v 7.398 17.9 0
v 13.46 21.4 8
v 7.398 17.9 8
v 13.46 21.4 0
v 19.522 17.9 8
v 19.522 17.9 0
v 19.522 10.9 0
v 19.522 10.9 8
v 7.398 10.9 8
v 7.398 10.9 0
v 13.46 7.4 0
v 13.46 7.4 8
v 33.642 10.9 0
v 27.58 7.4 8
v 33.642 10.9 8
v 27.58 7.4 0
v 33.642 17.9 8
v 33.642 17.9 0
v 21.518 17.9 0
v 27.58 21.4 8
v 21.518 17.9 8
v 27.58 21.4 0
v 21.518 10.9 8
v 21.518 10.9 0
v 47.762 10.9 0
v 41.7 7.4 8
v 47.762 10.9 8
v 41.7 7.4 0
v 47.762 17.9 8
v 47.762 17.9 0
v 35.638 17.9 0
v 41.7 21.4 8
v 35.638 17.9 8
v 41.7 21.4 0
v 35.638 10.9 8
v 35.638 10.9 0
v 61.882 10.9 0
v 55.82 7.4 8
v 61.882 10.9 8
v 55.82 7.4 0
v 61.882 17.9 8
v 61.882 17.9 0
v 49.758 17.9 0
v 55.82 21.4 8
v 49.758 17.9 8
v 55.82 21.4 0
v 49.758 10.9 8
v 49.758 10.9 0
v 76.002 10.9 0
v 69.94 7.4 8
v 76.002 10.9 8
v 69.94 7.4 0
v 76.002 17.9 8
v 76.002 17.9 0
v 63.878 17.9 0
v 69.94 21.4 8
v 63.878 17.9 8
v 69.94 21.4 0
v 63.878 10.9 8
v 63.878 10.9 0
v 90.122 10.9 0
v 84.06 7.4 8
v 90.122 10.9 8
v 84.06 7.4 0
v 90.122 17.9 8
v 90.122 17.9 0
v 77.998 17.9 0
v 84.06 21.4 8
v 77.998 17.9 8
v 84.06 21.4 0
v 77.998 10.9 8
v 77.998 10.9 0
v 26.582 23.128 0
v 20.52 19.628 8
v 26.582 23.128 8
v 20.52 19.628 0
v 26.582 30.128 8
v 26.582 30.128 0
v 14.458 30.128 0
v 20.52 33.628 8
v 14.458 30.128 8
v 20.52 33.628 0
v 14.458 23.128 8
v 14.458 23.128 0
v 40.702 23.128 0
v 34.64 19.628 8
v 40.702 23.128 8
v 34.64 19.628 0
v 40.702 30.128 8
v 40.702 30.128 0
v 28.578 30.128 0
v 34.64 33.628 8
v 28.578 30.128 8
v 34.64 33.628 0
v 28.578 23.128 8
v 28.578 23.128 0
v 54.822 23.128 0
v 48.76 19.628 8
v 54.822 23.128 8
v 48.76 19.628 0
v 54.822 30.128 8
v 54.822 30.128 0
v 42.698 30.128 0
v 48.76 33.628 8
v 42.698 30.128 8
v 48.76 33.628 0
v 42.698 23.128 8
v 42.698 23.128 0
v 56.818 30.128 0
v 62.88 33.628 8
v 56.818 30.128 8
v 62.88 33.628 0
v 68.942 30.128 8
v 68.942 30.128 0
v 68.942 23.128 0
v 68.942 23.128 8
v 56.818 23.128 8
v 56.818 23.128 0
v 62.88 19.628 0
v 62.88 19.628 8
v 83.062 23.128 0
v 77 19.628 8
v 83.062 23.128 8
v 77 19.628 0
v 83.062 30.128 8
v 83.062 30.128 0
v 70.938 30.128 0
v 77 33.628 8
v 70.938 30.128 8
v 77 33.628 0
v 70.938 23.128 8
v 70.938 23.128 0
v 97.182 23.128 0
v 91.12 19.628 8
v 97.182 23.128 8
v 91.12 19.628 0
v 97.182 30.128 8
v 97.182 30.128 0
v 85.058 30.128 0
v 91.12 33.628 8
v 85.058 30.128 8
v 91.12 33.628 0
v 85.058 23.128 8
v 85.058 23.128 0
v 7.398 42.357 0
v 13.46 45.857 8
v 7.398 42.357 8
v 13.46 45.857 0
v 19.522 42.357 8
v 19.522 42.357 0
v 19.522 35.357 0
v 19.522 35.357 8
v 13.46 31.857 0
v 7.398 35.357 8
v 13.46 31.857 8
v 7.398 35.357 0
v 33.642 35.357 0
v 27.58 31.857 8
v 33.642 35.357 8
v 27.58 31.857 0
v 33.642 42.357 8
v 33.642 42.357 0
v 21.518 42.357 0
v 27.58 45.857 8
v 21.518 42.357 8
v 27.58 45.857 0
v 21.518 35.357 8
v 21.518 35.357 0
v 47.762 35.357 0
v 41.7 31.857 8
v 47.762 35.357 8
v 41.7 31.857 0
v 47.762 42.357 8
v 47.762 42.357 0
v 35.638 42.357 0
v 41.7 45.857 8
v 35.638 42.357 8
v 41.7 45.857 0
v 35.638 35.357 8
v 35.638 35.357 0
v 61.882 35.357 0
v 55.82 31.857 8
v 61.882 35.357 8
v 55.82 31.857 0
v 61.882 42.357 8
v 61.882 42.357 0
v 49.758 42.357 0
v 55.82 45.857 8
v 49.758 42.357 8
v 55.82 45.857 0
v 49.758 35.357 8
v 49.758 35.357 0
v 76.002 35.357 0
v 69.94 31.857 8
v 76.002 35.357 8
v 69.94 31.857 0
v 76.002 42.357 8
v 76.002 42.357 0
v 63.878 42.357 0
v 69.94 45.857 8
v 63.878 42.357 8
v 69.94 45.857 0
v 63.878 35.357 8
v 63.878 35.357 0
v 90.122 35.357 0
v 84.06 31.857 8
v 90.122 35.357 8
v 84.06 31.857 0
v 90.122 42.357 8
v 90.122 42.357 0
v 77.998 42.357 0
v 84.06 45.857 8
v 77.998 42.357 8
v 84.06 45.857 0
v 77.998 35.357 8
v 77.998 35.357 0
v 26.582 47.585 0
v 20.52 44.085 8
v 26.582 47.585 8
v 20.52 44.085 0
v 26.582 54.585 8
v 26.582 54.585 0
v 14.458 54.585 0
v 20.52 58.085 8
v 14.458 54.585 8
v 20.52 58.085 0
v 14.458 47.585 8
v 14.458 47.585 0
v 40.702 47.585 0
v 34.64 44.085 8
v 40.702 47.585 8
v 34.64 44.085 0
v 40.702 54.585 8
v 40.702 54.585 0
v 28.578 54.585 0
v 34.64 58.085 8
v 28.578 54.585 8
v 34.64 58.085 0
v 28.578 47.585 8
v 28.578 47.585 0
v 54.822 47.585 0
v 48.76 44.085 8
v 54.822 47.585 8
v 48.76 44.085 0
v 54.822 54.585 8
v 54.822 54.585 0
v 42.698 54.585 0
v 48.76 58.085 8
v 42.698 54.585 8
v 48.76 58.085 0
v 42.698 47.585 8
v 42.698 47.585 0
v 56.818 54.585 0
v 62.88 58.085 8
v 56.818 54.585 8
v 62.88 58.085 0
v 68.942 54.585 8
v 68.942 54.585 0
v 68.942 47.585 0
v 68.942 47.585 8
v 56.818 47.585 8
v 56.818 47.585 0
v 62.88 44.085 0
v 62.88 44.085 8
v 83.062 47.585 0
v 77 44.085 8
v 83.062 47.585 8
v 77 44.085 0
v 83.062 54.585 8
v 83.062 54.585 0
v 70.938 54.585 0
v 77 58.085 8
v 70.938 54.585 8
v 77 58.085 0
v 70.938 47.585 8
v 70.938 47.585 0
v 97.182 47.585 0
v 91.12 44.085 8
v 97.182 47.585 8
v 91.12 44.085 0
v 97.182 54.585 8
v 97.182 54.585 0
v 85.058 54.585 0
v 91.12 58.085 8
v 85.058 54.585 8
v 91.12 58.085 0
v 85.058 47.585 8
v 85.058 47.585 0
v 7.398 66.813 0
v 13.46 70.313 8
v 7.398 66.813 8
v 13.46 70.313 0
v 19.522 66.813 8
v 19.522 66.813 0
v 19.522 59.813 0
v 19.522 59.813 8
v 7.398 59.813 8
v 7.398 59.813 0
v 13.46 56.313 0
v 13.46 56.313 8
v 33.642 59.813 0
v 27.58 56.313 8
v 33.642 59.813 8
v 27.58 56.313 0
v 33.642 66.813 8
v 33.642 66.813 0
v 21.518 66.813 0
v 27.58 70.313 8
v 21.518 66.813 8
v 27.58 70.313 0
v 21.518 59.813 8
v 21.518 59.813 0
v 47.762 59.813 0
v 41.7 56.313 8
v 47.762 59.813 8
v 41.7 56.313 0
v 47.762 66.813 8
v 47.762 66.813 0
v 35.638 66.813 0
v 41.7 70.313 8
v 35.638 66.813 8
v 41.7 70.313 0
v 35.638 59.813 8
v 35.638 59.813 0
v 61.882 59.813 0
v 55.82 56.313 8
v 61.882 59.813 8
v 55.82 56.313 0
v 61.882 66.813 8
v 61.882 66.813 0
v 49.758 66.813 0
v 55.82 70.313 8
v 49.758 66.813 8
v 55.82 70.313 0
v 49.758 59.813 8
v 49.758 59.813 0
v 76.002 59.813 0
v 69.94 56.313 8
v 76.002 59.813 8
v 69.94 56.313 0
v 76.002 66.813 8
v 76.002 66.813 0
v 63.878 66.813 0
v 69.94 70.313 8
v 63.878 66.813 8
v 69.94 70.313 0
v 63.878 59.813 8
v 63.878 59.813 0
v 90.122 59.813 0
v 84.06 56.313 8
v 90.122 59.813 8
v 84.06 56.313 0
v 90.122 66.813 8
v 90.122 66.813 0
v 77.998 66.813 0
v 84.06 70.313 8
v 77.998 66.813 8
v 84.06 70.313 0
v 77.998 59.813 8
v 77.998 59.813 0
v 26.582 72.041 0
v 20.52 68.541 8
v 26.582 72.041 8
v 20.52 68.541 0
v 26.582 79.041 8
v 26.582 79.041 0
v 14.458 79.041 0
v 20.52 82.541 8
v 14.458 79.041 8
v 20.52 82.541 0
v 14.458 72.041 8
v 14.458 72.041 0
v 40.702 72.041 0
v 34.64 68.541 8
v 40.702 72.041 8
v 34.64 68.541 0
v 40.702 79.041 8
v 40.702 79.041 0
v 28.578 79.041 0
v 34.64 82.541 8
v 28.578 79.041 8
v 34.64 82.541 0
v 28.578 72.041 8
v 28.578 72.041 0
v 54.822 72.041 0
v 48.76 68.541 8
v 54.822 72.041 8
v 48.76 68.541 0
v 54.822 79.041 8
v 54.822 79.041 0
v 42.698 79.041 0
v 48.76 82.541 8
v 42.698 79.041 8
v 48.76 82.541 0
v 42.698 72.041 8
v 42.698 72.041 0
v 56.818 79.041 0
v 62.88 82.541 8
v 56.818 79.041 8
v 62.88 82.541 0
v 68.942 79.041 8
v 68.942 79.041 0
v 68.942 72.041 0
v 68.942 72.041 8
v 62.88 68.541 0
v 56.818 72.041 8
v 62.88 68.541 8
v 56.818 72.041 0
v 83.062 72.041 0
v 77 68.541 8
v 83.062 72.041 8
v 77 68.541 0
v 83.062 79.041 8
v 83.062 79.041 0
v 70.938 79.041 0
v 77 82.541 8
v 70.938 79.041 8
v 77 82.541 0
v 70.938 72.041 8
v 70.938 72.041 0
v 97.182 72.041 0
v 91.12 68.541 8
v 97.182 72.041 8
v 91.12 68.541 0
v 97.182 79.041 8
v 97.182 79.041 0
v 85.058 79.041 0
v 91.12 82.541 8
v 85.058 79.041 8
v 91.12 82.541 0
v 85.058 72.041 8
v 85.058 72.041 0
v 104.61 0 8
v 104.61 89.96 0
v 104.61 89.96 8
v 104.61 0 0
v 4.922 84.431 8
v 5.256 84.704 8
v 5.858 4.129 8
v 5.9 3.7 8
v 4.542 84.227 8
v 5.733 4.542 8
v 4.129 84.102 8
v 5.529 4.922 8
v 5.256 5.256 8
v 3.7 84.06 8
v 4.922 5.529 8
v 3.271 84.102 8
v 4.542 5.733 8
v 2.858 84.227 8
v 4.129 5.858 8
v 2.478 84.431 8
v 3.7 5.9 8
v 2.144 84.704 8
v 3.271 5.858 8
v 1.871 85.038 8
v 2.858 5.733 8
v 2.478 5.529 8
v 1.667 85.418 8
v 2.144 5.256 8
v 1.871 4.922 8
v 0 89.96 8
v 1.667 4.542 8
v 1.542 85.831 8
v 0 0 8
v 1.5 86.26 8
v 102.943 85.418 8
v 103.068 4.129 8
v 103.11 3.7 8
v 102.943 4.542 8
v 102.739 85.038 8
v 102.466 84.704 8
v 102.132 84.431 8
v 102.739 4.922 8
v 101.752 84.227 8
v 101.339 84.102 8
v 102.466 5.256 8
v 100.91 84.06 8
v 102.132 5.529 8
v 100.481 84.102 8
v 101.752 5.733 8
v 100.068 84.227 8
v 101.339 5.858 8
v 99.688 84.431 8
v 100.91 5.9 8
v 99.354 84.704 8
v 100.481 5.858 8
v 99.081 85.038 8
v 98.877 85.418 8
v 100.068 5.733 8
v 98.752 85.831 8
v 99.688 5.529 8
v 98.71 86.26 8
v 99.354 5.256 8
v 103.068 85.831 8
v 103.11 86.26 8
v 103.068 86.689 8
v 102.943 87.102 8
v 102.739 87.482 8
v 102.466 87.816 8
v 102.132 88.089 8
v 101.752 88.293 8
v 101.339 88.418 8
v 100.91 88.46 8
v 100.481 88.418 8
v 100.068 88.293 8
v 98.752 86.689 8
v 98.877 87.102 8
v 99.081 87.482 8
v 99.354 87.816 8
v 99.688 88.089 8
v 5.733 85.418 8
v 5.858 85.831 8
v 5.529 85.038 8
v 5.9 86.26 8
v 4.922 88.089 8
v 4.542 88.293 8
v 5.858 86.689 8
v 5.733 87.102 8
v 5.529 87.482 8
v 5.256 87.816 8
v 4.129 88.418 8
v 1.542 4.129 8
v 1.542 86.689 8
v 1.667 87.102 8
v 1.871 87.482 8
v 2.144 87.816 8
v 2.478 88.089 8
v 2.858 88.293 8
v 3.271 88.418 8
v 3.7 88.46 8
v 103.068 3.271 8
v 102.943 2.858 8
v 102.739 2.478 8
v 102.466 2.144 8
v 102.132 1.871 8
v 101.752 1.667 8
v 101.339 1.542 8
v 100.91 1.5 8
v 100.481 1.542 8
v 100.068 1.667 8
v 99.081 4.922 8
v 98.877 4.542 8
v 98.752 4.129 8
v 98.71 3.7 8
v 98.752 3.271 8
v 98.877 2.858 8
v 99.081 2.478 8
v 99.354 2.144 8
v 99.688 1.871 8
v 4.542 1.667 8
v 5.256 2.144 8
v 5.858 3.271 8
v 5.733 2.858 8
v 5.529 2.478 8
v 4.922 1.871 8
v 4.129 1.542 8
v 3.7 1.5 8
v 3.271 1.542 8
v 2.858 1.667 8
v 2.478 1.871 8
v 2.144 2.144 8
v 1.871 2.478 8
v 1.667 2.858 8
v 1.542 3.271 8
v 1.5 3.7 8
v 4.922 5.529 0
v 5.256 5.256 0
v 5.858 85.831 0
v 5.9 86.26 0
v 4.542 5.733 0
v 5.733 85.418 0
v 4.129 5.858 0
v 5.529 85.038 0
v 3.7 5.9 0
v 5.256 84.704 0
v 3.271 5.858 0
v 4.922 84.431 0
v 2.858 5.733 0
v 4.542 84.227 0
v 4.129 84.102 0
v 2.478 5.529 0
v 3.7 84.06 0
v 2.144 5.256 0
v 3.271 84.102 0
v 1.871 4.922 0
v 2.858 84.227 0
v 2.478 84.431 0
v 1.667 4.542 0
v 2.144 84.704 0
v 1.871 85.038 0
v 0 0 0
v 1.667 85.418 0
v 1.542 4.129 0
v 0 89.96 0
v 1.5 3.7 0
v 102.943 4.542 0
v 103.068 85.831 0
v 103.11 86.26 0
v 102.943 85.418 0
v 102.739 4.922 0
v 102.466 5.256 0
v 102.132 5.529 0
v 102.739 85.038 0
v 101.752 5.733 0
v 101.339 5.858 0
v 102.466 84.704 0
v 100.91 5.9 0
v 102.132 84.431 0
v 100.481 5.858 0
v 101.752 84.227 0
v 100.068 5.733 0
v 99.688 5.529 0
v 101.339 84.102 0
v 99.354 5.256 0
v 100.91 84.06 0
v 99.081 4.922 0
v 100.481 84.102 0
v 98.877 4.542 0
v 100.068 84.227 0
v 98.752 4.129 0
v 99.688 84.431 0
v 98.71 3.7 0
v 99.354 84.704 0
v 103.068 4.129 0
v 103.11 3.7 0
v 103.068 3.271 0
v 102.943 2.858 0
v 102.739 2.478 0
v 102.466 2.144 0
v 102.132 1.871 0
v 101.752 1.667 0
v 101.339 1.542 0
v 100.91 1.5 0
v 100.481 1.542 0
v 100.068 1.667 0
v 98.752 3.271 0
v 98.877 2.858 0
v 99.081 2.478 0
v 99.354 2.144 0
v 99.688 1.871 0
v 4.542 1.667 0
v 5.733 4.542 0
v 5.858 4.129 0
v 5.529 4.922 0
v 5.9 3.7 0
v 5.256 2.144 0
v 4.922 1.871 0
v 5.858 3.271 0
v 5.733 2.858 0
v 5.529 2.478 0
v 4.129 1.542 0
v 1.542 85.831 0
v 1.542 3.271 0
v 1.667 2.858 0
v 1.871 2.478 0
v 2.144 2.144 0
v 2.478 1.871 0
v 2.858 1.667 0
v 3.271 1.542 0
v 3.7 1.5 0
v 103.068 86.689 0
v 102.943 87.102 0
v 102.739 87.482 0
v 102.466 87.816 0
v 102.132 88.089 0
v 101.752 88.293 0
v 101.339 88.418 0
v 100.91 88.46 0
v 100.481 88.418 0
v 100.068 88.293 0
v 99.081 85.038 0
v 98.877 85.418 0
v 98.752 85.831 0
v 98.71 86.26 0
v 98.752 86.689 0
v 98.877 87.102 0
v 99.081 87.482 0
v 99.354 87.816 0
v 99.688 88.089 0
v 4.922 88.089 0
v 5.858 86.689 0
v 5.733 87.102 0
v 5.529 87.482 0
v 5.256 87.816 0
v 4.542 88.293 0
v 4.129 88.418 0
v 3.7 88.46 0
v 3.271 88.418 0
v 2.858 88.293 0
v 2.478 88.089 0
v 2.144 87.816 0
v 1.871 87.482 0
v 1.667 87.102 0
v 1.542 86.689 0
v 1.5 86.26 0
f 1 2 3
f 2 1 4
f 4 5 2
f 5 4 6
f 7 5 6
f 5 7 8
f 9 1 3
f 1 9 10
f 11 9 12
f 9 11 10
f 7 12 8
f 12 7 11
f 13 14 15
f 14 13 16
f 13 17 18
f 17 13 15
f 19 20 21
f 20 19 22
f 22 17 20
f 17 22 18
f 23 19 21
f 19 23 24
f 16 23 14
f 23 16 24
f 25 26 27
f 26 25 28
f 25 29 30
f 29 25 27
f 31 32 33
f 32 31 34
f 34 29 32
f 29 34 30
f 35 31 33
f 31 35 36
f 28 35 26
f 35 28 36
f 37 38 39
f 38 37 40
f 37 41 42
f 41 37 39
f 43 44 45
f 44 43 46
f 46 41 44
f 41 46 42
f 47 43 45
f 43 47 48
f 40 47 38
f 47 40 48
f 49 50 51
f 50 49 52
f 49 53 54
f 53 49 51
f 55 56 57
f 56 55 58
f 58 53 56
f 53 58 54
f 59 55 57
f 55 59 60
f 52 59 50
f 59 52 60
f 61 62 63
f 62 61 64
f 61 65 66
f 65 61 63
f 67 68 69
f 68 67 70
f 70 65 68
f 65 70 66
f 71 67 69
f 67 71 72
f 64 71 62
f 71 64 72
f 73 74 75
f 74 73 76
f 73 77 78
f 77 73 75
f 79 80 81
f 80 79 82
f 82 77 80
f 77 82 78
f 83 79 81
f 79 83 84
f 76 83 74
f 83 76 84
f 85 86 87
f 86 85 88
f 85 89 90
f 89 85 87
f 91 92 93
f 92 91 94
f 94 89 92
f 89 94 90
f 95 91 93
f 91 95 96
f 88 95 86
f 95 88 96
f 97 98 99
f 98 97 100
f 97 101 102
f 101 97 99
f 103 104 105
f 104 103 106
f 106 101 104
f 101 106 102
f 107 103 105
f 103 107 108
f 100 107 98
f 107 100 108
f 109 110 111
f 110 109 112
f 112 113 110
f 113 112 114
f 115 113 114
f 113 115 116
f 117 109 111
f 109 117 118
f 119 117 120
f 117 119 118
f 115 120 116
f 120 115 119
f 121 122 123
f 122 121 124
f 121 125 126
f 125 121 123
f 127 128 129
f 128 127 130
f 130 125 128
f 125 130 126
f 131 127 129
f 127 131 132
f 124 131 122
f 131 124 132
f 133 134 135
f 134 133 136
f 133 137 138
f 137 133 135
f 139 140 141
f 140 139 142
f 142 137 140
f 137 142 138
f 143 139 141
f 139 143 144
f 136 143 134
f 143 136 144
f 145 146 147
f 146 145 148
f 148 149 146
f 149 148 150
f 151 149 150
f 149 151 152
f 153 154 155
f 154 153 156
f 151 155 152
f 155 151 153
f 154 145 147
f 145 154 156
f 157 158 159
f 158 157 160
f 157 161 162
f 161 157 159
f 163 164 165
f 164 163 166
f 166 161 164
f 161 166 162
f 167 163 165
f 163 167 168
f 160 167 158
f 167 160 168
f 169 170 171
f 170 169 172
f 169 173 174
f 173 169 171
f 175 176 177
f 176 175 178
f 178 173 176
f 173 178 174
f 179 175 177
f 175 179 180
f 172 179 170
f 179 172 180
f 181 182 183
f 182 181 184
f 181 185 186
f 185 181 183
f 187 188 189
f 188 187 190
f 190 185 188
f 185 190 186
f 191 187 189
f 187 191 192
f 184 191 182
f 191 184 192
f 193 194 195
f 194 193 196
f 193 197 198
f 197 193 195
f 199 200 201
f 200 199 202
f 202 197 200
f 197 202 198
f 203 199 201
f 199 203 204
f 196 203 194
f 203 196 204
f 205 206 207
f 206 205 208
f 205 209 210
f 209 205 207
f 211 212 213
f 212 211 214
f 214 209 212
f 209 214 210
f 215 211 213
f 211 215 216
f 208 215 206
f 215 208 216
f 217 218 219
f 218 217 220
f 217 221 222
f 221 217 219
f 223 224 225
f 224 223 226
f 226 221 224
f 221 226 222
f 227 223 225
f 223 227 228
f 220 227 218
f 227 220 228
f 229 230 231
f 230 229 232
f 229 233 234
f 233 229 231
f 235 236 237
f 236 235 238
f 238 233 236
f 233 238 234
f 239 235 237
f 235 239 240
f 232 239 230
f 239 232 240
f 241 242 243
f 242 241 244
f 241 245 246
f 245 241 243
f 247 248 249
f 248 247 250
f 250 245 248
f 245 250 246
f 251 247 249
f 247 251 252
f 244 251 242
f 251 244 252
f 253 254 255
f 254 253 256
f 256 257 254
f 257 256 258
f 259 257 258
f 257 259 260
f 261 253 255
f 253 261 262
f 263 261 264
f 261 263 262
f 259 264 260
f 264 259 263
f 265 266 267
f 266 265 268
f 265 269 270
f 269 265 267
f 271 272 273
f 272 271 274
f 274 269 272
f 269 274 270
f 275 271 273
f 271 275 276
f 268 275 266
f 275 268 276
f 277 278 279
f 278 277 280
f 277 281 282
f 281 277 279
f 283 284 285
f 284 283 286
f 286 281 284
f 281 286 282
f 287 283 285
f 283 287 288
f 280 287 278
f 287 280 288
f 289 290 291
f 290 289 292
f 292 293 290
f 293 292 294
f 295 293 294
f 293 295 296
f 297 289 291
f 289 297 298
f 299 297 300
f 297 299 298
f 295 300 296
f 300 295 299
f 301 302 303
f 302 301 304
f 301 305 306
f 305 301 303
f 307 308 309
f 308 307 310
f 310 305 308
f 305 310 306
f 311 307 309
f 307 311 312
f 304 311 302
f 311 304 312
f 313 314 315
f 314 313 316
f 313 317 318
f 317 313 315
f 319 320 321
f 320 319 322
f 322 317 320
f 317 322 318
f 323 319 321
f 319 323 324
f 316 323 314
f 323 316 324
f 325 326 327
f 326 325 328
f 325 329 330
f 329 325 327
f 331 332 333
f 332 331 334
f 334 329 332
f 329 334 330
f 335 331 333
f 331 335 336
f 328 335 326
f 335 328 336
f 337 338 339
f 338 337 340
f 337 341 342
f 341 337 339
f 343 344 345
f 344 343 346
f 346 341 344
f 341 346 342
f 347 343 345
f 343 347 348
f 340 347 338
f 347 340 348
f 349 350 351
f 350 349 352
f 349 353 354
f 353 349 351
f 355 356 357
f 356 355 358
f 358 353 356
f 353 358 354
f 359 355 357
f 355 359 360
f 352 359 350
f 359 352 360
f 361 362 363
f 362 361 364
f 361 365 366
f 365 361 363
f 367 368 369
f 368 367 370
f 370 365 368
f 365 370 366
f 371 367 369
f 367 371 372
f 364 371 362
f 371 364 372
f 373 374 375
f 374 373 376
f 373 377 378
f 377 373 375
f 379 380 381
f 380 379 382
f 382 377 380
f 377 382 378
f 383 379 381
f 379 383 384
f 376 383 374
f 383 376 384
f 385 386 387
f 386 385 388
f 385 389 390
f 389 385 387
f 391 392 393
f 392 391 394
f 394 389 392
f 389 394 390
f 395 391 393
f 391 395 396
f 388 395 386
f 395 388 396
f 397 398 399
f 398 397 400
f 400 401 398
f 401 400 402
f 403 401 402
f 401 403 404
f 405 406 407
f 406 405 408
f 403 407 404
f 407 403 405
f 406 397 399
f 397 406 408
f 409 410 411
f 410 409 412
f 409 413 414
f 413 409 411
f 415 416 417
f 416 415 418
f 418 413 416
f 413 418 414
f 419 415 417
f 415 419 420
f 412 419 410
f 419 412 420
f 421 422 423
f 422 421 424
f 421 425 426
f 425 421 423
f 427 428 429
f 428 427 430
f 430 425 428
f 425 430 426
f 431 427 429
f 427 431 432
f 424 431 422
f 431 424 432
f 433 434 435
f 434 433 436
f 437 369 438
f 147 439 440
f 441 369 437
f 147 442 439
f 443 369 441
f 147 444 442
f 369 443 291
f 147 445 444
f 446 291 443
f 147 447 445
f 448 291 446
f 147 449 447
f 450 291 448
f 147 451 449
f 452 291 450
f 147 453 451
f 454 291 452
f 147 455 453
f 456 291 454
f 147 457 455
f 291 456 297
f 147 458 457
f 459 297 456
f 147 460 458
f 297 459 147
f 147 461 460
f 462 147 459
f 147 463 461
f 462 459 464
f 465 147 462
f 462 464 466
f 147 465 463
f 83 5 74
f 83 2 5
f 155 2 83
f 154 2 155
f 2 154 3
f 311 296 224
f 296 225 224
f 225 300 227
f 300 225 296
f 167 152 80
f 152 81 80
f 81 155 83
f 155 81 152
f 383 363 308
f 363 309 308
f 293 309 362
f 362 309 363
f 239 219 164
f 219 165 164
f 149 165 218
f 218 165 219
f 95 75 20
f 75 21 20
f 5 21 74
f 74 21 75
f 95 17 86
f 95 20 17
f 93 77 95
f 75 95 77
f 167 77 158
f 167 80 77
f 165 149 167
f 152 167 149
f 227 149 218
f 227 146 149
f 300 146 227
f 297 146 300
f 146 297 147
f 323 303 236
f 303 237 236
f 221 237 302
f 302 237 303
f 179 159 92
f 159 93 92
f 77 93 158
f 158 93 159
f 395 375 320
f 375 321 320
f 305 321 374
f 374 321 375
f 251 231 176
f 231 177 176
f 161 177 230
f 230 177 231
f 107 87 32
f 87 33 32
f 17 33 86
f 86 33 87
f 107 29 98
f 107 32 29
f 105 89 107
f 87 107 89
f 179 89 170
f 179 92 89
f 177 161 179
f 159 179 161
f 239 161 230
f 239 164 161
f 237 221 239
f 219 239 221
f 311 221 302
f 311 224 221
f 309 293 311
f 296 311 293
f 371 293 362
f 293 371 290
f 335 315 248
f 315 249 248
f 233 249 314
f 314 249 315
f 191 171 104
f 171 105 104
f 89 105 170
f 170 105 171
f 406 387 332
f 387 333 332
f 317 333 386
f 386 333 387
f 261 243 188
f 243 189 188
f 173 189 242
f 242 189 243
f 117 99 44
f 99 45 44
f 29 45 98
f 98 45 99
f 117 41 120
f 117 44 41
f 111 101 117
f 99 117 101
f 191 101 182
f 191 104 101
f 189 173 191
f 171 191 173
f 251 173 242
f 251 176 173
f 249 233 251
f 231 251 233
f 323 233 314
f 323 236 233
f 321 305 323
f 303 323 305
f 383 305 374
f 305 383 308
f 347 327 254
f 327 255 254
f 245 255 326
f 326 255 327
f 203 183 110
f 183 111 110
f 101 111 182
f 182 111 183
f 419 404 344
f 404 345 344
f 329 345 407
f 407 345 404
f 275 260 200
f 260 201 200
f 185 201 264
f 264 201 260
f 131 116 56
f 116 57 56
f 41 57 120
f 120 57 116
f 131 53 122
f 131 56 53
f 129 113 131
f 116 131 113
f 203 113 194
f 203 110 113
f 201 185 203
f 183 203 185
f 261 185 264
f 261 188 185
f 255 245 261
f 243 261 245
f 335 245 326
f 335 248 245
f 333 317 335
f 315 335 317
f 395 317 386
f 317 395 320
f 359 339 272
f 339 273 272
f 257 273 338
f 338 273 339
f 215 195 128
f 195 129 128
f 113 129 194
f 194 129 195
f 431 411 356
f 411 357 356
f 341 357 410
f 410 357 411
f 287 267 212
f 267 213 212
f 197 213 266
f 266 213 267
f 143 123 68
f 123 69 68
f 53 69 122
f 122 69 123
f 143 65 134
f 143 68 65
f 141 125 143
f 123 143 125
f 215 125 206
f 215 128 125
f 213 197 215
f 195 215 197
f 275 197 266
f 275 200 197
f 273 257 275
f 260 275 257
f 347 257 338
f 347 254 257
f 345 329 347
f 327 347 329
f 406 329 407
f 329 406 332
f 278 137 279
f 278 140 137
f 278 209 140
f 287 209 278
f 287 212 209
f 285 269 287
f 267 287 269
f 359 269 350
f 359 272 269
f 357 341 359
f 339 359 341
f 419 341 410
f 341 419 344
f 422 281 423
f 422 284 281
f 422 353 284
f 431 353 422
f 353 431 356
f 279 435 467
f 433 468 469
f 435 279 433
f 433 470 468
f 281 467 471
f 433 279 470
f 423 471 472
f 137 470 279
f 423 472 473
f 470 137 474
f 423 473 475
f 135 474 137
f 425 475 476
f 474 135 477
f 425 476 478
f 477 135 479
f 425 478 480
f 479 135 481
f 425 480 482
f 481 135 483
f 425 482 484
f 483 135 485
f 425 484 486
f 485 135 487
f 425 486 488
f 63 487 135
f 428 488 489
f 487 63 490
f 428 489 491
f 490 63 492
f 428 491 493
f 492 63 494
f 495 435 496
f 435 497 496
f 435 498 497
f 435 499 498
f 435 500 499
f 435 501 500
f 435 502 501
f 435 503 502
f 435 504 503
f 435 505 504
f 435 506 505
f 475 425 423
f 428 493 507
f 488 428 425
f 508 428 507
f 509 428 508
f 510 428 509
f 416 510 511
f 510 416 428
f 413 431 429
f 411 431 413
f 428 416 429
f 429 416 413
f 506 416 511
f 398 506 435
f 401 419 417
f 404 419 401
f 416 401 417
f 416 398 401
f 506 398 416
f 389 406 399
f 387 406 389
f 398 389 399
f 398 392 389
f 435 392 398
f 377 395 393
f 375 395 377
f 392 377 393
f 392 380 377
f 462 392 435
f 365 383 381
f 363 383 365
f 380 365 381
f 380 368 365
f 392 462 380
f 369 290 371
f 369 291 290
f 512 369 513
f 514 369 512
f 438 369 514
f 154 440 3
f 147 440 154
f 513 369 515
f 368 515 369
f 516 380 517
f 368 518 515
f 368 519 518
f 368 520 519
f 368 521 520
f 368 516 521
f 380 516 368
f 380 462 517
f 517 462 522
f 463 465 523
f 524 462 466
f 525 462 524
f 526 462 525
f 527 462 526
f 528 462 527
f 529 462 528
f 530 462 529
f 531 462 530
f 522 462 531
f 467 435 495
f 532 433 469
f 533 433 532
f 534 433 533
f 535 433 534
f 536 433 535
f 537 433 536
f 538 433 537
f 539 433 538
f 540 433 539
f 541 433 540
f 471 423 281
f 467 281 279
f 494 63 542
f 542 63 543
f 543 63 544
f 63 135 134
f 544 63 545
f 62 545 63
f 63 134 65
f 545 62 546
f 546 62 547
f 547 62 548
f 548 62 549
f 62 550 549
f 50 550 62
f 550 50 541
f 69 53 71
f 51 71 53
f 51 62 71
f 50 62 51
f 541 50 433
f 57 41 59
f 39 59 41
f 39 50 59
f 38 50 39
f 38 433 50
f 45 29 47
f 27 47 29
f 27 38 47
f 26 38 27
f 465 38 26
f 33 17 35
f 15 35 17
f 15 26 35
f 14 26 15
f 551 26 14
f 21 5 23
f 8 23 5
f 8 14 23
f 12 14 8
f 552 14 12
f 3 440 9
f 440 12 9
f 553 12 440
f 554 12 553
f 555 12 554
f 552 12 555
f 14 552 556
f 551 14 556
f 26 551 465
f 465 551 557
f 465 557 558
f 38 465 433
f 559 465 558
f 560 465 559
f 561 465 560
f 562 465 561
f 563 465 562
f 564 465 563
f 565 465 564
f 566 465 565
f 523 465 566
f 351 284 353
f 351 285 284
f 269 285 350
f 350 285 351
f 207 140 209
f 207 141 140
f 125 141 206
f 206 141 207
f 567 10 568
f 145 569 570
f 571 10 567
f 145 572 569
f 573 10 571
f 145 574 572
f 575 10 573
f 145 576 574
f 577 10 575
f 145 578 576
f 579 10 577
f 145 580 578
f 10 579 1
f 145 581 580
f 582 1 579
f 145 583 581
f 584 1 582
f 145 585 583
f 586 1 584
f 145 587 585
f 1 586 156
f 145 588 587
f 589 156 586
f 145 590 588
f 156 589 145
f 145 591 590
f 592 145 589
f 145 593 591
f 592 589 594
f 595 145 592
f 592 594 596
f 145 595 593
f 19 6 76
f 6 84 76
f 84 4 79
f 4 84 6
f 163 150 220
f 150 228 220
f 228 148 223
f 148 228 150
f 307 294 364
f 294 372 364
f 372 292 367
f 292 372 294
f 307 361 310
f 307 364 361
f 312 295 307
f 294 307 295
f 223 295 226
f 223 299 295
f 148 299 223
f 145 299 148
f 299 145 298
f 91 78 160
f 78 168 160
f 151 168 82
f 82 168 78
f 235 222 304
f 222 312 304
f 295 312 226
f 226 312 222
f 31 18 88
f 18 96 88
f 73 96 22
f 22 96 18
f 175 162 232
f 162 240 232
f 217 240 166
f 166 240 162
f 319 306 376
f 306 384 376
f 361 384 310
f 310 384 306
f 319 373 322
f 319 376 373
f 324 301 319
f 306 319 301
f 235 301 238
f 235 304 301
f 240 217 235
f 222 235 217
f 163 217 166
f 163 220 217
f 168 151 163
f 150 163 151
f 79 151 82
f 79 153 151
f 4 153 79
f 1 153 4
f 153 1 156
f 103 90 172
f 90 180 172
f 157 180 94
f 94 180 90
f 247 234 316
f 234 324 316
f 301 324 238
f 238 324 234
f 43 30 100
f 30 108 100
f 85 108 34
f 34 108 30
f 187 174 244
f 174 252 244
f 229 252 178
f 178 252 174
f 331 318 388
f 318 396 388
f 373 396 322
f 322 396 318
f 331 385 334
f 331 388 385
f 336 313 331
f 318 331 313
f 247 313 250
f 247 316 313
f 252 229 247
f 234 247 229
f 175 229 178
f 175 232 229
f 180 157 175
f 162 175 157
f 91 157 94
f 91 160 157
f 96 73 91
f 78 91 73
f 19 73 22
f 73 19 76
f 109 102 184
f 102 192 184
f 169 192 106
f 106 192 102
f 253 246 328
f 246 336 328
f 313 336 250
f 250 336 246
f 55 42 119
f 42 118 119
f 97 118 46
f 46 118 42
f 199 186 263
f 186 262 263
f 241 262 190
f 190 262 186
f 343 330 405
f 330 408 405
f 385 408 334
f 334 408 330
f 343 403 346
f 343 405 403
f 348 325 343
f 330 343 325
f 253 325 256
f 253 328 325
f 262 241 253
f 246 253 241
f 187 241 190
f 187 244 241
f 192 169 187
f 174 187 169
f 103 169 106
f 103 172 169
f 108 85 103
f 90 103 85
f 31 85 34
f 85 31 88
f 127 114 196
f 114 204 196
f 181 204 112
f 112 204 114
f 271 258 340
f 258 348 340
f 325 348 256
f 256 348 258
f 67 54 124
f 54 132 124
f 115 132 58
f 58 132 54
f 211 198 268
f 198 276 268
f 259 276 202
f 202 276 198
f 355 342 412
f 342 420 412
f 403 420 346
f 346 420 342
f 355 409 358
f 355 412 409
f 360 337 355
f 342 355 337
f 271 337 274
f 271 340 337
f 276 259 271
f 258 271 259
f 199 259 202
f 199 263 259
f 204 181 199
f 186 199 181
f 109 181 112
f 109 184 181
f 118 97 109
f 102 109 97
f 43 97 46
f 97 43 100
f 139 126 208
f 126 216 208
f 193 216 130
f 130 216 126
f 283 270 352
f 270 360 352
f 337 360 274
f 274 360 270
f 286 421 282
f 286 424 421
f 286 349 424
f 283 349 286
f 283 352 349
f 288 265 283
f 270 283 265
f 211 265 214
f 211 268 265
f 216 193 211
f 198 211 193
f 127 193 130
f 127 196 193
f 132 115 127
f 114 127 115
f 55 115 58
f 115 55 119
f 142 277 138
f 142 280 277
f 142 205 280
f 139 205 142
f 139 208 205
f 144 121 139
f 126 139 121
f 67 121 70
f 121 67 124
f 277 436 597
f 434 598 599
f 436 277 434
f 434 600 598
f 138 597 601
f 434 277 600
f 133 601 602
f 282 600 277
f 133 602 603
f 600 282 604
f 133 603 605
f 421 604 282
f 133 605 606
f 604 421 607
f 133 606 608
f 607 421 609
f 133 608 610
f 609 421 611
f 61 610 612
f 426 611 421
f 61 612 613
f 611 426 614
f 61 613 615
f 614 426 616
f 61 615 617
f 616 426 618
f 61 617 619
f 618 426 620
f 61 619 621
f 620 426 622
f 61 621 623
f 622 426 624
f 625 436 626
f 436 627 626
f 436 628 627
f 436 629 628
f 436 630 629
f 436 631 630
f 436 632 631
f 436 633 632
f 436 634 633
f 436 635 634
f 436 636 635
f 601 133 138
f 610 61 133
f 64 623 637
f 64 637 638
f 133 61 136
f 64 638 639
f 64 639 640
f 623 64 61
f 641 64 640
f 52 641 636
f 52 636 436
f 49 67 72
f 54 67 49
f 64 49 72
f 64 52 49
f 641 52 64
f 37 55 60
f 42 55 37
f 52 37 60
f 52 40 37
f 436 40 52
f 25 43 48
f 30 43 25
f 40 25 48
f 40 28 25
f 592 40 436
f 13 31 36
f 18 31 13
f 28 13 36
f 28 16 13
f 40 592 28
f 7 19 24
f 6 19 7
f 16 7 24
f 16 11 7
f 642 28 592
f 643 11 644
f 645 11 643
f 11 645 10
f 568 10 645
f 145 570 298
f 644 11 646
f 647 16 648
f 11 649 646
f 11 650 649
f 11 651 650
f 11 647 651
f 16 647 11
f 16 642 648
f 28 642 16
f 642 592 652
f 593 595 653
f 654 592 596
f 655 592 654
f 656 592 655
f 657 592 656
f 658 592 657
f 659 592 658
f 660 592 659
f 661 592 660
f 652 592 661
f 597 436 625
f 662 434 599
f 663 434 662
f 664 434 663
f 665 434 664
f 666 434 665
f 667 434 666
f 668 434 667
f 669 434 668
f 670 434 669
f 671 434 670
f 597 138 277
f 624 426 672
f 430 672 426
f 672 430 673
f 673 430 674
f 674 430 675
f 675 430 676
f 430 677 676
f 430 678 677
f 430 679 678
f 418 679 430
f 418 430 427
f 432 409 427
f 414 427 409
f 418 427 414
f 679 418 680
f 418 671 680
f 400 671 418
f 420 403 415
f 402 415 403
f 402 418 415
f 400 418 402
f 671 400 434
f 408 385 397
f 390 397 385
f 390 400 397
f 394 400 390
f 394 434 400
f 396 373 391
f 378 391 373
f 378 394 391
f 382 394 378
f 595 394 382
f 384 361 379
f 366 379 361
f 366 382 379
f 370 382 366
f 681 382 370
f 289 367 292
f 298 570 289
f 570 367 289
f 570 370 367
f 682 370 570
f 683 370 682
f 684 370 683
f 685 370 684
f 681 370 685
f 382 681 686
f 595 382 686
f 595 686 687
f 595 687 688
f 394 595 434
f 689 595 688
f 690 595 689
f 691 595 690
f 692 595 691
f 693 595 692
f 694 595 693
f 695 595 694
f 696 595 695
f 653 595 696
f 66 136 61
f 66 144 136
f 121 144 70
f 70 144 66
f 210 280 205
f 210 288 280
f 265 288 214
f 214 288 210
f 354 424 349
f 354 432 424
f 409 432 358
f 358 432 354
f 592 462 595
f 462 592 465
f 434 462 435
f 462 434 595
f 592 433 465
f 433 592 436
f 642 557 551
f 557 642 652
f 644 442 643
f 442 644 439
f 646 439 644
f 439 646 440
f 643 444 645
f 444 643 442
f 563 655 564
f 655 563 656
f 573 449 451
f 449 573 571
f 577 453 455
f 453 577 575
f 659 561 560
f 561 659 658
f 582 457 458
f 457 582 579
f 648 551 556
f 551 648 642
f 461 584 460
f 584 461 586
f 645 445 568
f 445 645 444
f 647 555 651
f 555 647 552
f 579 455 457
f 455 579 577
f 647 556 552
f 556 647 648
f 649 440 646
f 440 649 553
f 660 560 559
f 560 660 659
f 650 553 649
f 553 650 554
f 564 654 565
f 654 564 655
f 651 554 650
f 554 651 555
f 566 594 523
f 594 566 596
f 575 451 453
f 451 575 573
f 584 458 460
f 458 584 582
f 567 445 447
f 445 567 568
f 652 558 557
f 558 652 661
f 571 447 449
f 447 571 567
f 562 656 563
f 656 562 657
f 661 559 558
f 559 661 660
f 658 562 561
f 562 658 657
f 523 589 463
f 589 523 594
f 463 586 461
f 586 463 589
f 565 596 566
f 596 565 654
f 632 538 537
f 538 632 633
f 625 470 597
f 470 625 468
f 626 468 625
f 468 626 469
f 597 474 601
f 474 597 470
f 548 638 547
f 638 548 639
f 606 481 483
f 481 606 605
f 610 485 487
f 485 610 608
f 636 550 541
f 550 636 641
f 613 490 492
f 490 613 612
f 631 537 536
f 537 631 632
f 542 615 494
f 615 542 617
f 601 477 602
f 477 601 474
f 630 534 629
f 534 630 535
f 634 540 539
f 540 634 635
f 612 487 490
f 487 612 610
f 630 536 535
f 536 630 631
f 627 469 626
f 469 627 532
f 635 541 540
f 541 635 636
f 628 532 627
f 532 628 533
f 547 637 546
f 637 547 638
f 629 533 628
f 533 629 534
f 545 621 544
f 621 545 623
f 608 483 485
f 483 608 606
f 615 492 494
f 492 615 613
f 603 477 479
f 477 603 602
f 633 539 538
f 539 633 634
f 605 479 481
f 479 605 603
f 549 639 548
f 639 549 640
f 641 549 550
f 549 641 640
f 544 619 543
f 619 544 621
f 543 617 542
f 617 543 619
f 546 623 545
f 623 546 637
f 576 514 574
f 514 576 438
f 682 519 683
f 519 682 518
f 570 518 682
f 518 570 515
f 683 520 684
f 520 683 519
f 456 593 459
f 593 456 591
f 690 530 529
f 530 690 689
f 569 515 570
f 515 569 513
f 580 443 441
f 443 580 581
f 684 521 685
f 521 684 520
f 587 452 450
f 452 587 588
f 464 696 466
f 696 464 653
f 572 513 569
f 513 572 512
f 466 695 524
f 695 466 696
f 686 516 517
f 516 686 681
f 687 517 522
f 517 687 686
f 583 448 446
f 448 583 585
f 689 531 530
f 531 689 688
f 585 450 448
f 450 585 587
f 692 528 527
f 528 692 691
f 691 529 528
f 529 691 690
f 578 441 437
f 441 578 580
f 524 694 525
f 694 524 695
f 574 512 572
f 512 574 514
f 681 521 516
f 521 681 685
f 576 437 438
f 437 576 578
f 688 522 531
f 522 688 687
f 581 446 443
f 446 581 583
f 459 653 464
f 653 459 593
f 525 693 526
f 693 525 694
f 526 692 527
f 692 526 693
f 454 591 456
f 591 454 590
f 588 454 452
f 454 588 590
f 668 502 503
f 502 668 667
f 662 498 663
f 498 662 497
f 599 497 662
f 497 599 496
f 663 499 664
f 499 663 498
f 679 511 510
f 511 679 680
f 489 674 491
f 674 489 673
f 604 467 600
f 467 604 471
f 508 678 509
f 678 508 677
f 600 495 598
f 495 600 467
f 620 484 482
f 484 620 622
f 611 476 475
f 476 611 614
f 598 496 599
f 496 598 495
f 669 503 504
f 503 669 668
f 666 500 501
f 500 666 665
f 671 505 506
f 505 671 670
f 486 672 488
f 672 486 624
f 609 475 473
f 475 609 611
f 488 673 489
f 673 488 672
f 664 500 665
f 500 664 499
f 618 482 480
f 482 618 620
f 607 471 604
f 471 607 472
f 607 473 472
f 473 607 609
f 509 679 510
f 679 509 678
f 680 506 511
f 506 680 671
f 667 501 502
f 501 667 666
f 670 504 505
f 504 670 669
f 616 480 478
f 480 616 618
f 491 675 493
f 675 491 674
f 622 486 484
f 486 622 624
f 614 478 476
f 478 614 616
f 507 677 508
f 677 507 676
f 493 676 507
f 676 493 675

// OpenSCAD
$fn = 32;

// ----------------------------------------------------------------------
// Honeycomb panel: 104.61 x 89.96 mm, 36 cells of 14 mm
// ----------------------------------------------------------------------

// --- parameters (mm) ---
panel_w = 104.61;         // panel width
panel_d = 89.96;          // panel depth
thick = 8;                // panel thickness
cell_r = 7;               // hex cell circumradius
pitch = 14.12;            // hex cell pitch (centre to centre)
web = 2;                  // web between the cells
columns = 6;              // columns of cells
rows = 6;                 // rows of cells
cell_count = 36;          // total cells
shift_x = 13.46;          // first cell offset in x
shift_y = 14.4;           // first cell offset in y
mount_d = 4.4;            // corner mounting holes
hole_off = 3.7;           // mounting hole offset from the corners

difference() {
  union() {
    cube([panel_w, panel_d, thick]);
  }
  /* hexagonal cells, point-up, cut right through the plate */
  for (row = [0 : rows - 1]) {
    for (col = [0 : columns - 1]) {
      translate([shift_x + col * pitch + (row % 2) * pitch / 2, shift_y + row * pitch * 0.866025, -2.5]) rotate([0, 0, 30]) cylinder(h = thick + 5, d = 2 * cell_r, $fn = 6);
    }
  }
  /* corner mounting holes, clear of the outer cell web */
  translate([3.7, 3.7, -2.5]) cylinder(h = thick + 5, d = mount_d);
  translate([100.91, 3.7, -2.5]) cylinder(h = thick + 5, d = mount_d);
  translate([3.7, 86.26, -2.5]) cylinder(h = thick + 5, d = mount_d);
  translate([100.91, 86.26, -2.5]) cylinder(h = thick + 5, d = mount_d);
}
